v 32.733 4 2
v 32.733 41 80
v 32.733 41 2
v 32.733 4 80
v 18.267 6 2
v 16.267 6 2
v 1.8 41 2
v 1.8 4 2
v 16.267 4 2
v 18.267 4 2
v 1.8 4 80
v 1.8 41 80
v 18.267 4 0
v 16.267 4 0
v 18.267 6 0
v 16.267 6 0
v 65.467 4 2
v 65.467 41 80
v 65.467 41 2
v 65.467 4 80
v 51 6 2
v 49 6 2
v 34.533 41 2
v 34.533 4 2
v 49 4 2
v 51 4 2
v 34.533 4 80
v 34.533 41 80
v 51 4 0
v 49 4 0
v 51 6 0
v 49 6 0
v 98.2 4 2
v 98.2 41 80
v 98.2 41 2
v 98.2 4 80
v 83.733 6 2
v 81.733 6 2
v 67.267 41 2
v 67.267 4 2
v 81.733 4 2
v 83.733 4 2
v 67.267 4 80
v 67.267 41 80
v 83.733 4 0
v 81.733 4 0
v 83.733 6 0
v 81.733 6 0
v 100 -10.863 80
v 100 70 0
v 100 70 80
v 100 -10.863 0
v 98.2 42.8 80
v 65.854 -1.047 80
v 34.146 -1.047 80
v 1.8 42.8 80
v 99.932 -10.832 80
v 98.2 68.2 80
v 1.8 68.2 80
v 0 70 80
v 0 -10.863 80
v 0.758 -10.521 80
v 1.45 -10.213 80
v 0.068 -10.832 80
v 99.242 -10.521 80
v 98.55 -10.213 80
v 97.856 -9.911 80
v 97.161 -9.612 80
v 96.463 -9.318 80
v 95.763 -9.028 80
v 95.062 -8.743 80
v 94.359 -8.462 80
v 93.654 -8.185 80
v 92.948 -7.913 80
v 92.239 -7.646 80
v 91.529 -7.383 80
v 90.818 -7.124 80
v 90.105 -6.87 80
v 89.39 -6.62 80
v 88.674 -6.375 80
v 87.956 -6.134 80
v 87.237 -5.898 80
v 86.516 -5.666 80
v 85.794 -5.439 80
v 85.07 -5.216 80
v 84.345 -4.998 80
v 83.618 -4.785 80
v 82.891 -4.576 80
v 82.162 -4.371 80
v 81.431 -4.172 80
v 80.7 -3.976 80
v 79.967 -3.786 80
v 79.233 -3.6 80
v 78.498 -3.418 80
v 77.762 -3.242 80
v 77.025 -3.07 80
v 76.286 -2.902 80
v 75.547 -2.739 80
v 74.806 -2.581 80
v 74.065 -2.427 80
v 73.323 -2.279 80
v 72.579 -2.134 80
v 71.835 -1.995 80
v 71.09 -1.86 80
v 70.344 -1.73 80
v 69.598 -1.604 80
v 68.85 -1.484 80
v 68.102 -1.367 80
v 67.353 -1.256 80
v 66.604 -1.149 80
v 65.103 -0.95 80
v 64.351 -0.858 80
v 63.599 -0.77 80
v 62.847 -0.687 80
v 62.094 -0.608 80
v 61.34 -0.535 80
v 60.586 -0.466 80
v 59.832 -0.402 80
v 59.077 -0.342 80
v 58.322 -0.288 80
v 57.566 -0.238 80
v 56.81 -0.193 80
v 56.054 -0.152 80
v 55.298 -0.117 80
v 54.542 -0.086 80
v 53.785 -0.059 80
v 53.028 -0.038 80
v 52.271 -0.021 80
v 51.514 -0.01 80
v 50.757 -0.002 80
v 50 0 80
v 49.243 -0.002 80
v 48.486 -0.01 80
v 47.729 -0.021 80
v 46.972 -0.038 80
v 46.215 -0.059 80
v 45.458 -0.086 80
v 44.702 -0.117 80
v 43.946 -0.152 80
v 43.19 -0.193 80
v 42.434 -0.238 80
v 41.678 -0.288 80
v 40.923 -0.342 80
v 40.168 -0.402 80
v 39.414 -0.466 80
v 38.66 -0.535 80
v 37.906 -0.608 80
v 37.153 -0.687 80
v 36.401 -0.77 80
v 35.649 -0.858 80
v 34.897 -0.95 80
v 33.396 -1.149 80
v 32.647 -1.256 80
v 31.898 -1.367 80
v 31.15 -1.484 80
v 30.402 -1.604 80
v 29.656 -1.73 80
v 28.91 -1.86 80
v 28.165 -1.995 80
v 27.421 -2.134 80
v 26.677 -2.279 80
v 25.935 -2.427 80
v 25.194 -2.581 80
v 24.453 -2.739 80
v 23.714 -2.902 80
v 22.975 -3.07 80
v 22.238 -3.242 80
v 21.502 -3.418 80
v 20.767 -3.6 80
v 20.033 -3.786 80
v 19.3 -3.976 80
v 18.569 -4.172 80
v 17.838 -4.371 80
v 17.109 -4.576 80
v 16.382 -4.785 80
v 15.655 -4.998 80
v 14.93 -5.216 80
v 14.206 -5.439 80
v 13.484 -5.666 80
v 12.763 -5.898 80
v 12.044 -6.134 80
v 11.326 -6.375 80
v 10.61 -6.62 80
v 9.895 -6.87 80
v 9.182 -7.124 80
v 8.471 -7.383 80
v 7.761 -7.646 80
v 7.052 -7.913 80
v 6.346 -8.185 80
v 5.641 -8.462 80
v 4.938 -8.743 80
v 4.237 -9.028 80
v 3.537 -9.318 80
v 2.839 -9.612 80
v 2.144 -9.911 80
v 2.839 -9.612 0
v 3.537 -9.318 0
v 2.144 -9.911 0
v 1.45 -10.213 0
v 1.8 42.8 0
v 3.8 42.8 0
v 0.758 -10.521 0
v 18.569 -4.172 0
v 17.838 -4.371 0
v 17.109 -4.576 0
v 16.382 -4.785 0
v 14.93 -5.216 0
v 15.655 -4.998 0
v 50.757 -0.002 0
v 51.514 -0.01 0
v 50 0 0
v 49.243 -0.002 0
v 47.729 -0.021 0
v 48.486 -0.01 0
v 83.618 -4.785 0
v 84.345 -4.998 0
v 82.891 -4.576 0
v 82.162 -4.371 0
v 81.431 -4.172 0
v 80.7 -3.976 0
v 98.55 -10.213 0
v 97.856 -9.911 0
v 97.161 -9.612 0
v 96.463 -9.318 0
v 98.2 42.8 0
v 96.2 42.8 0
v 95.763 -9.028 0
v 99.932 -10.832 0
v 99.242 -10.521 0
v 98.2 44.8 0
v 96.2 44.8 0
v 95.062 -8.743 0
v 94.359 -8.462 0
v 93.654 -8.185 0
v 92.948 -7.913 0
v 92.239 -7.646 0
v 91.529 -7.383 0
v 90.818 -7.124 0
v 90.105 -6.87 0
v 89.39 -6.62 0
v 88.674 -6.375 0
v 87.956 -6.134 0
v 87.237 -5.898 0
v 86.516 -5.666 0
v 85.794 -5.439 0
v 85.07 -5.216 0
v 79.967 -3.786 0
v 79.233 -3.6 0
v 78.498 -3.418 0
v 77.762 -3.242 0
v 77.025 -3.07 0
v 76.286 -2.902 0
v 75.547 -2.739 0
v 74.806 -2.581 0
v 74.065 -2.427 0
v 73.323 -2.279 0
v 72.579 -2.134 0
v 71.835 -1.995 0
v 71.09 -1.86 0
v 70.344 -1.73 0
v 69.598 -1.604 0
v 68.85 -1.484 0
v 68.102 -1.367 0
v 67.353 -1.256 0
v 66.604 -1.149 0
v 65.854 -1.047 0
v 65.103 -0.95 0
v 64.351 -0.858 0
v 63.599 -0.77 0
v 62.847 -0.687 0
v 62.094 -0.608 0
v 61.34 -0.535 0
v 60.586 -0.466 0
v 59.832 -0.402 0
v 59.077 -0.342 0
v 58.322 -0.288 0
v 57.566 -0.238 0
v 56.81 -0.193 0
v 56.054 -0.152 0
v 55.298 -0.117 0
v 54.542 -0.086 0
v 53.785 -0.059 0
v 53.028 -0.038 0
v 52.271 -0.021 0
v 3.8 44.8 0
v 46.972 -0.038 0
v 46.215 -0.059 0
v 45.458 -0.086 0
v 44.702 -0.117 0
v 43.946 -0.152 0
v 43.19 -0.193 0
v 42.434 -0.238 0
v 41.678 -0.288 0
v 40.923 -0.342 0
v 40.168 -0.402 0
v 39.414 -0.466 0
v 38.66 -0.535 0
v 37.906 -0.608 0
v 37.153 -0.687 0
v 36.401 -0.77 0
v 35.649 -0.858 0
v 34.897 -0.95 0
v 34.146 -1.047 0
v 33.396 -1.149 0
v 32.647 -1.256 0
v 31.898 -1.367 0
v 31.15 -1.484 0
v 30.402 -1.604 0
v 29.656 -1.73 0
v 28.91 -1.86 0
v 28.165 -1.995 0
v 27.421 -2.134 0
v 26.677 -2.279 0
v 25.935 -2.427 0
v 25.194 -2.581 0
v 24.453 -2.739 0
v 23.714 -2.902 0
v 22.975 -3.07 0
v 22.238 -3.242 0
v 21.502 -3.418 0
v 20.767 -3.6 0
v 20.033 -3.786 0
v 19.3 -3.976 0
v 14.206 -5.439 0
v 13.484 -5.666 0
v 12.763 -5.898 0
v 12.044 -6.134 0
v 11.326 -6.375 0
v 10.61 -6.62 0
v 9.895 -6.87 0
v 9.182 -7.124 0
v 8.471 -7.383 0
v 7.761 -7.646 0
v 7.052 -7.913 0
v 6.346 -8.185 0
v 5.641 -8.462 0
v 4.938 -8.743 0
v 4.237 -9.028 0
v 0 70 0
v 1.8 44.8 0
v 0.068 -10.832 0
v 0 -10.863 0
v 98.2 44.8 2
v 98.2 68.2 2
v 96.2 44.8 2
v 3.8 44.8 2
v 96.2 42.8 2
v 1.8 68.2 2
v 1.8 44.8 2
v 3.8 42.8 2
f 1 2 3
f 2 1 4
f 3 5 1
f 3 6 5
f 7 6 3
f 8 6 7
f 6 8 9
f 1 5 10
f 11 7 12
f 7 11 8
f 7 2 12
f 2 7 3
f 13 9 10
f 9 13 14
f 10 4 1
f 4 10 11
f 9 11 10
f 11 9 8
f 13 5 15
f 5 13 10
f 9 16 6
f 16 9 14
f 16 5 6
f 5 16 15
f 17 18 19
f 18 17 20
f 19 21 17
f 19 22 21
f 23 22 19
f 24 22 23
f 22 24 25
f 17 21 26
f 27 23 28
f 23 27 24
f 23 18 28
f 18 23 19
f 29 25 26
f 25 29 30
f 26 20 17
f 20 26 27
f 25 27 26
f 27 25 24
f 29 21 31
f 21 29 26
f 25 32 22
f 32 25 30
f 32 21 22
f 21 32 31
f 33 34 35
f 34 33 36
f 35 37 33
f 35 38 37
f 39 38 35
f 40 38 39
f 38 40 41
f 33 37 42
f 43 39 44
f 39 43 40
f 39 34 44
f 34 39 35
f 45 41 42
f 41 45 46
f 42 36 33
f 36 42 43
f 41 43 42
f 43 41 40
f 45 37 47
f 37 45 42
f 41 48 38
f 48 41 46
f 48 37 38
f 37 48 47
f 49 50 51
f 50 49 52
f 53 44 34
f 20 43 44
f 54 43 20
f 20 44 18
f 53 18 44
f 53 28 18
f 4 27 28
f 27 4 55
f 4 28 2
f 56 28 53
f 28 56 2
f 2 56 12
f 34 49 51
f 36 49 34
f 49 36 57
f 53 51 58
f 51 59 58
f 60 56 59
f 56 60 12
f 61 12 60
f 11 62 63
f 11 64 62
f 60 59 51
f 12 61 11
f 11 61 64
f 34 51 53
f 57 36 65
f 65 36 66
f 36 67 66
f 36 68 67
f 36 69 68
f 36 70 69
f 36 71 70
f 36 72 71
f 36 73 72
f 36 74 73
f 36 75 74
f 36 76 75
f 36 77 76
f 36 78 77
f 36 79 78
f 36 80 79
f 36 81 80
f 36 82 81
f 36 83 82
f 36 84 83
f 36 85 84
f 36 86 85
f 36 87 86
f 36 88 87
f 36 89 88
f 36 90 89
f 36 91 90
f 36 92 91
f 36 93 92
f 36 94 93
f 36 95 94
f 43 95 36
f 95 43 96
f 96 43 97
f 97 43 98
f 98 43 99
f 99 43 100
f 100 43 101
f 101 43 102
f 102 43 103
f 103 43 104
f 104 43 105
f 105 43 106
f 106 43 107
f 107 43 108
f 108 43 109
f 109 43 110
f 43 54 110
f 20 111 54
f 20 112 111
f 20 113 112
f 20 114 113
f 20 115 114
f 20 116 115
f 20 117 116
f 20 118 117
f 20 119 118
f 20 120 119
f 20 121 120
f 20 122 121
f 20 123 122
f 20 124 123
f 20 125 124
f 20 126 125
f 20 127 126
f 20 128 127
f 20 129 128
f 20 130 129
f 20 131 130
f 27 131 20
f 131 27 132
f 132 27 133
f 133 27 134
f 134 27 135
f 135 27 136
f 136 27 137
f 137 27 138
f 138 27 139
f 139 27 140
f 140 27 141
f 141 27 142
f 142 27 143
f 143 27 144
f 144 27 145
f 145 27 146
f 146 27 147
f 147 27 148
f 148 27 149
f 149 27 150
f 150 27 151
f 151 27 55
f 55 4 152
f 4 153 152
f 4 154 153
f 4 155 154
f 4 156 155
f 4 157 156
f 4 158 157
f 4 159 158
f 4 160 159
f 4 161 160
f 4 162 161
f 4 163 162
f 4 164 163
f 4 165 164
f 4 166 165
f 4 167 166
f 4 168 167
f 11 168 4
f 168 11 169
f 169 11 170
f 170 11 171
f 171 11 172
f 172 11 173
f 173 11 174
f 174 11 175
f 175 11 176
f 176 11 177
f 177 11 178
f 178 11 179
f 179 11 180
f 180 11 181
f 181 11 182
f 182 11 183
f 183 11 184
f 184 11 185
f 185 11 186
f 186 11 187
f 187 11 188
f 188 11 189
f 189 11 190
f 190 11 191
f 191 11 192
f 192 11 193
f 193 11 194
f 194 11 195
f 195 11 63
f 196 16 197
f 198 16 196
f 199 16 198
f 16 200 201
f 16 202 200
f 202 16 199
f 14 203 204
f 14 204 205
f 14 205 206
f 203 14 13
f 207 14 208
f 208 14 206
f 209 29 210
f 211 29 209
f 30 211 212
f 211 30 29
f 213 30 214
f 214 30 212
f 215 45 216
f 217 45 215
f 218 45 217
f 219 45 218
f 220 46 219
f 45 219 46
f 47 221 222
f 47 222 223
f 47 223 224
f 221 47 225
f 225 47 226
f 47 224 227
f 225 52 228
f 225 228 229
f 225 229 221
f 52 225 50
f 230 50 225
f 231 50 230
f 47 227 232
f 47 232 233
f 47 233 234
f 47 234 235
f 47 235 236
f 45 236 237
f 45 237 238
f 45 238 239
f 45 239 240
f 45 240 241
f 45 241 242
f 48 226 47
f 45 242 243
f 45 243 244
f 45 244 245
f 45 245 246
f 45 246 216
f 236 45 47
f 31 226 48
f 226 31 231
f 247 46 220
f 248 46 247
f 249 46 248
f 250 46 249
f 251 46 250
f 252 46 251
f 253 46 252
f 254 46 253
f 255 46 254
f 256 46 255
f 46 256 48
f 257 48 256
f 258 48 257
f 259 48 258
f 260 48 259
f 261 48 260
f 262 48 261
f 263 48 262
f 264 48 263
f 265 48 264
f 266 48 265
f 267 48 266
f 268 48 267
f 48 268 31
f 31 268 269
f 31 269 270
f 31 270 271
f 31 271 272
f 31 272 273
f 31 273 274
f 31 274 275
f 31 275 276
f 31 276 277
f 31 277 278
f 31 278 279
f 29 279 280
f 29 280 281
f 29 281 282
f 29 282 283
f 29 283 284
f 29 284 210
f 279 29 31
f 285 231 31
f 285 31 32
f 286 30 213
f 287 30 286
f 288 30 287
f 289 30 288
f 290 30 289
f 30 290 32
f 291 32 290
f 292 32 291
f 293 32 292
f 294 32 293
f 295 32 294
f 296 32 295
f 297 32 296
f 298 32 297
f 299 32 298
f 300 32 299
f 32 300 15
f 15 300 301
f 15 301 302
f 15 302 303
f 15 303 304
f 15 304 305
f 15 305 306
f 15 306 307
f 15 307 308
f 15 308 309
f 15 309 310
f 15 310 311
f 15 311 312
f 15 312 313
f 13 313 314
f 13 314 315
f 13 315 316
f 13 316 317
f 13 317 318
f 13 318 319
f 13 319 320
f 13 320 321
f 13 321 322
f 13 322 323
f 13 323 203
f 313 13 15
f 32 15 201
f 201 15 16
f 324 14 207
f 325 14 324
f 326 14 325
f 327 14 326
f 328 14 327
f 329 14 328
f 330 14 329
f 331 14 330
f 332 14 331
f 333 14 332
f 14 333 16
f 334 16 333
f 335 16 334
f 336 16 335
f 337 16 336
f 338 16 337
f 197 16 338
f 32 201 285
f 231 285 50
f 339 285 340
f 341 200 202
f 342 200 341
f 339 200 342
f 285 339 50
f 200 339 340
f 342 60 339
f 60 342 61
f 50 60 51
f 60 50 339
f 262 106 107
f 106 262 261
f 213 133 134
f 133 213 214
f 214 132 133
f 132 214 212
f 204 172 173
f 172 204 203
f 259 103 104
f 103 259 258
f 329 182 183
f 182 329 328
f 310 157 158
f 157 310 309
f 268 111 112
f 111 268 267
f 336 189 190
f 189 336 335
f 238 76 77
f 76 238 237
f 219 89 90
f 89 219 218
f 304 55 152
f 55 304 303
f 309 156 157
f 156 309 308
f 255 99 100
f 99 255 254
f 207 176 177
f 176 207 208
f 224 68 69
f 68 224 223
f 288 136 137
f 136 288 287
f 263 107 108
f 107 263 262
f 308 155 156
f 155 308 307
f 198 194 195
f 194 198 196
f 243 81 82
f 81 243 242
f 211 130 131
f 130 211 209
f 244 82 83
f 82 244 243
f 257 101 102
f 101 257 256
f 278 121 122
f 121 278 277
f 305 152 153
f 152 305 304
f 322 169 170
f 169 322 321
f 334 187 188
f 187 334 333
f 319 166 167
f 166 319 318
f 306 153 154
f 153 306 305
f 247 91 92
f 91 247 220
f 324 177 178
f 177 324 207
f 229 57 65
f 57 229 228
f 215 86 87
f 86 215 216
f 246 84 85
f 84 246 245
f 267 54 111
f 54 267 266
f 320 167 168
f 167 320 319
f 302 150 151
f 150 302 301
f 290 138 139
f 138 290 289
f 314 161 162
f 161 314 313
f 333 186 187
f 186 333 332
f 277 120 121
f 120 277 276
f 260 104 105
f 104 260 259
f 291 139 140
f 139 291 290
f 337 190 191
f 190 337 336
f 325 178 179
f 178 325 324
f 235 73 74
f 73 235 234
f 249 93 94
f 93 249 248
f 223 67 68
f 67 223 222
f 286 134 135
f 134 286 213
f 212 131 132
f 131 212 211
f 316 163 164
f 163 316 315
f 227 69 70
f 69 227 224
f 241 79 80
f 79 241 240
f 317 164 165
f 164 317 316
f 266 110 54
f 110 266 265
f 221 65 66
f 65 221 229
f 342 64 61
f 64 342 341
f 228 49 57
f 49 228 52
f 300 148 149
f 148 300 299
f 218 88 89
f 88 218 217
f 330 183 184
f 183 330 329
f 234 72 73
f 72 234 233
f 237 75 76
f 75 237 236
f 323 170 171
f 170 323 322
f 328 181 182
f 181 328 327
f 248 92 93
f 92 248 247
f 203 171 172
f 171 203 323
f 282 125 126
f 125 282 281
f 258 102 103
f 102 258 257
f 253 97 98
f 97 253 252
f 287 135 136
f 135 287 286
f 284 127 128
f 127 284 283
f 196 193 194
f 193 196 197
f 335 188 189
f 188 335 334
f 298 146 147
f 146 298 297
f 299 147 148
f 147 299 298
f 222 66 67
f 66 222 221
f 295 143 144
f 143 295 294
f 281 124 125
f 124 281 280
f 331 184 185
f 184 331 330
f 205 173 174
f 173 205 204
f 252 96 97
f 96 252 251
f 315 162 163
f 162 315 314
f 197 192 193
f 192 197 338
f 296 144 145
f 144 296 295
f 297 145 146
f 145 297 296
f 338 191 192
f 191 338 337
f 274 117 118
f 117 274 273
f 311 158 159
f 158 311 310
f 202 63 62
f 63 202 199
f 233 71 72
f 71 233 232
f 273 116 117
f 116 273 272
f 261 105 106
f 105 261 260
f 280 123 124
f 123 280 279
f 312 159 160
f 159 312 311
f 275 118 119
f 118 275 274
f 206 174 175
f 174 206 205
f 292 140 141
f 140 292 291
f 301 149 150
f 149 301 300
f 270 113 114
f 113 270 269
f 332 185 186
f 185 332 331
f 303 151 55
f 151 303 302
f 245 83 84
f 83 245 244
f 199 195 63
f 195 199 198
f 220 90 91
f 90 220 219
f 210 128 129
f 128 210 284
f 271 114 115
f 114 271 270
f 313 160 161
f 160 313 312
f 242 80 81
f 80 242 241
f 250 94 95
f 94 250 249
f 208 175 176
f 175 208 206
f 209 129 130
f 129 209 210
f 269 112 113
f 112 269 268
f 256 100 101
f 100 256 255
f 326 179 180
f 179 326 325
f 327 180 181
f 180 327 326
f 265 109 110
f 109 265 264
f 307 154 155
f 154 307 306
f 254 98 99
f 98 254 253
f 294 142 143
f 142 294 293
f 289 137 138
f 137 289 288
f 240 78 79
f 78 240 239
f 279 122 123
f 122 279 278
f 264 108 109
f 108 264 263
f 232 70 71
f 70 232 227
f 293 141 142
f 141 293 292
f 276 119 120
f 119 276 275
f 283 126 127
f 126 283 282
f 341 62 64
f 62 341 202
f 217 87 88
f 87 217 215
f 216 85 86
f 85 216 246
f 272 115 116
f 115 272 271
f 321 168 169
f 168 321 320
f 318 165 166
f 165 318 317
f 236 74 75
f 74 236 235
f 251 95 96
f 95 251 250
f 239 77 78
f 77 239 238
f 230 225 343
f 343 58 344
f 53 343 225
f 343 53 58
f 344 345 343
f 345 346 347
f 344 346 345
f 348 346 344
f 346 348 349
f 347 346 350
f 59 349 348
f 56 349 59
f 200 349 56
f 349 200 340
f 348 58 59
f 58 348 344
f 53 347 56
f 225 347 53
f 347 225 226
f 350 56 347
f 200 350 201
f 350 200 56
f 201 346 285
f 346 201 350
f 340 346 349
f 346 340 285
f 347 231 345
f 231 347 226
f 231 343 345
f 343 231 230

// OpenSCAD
//should be multiples of nozzle diameter
wallsize = 1.8; 

//overall x.y.z dimensions of the box
boxy = [100, 70, 80];
//diameter of the column the box attaches to
cyl_size = 241;

//initial positions
mainxpos = wallsize;
//initial start point away from the cylinder cutout
mainypos = 4;
//bottom thickness
mainzpos = 2; //[1:20]
//small pen holder dimensions
cutout = [((boxy.x-wallsize)/3)-wallsize, 37, boxy.z];

drainage_hole = [2, 2, mainzpos+6];

longx = boxy.x - (wallsize*2);
longy = boxy.y - (cutout.y + (wallsize*2) + (mainypos));

module lbox(lx, ly, lz) {
    translate([lx, ly, lz])
    //main slot    
        cube([cutout.x, cutout.y, cutout.z+2], center=false);
    //drainage 'oles    
    translate([lx+(cutout.x/2)-(drainage_hole.x/2), ly, -1])
        cube(drainage_hole, center=false);
};

difference() {
//main box (-40 so that cylinder chops it out
    translate([0,-40,0])
        cube([boxy.x, boxy.y+40, boxy.z], center=false);
//cylinder part (subtracted)
    translate([boxy.x/2, -cyl_size/2, -1])
        cylinder(boxy.z+wallsize+5, d=cyl_size, $fn=1000);
//small slot for pens x3    
    for (i=[0:2]) {
        lbox((wallsize*(i+1))+(cutout.x * i), mainypos, mainzpos);
    };

//big slot
    translate([wallsize,boxy.y-(wallsize+longy),mainzpos])
        cube([longx, longy, boxy.z], center=false);    

//drainage in either side of big slot
    translate([wallsize,boxy.y-(wallsize+longy),(-1)])
        cube(drainage_hole, center=false);    
    translate([wallsize+longx-(drainage_hole.x),boxy.y-(wallsize+longy),(-1)])
        cube(drainage_hole, center=false);  

};
